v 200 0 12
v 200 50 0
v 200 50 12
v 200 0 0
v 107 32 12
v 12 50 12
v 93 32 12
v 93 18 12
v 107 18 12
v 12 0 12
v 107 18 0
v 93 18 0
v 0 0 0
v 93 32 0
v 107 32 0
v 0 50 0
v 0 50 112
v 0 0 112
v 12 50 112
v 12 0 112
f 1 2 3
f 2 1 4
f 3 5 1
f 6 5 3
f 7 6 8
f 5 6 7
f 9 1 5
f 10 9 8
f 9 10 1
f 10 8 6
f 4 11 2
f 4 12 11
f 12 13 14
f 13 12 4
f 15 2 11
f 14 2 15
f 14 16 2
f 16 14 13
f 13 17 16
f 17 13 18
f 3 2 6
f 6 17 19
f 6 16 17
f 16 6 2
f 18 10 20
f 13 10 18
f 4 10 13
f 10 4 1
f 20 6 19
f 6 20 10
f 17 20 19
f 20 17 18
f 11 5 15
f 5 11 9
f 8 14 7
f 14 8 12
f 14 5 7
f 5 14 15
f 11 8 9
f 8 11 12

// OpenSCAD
$fn = 32;

// ----------------------------------------------------------------------
// Gantry bracket: 200-250 mm L bracket
// ----------------------------------------------------------------------

// --- parameters (mm) ---
base_l = 200;             // base arm length, X
arm_w = 50;               // arm width, Y
thick = 12;               // arm thickness
up_h = 100;               // vertical arm height, Z
slot_w = 14;              // adjustment slot width in the base

total_h = up_h + thick;  // overall height

difference() {
  union() {
    cube([base_l, arm_w, thick]);
    cube([thick, arm_w, total_h]);
  }
  translate([base_l / 2 - slot_w / 2, arm_w / 2 - slot_w / 2, -1])
    cube([slot_w, slot_w, thick + 2]);
}
